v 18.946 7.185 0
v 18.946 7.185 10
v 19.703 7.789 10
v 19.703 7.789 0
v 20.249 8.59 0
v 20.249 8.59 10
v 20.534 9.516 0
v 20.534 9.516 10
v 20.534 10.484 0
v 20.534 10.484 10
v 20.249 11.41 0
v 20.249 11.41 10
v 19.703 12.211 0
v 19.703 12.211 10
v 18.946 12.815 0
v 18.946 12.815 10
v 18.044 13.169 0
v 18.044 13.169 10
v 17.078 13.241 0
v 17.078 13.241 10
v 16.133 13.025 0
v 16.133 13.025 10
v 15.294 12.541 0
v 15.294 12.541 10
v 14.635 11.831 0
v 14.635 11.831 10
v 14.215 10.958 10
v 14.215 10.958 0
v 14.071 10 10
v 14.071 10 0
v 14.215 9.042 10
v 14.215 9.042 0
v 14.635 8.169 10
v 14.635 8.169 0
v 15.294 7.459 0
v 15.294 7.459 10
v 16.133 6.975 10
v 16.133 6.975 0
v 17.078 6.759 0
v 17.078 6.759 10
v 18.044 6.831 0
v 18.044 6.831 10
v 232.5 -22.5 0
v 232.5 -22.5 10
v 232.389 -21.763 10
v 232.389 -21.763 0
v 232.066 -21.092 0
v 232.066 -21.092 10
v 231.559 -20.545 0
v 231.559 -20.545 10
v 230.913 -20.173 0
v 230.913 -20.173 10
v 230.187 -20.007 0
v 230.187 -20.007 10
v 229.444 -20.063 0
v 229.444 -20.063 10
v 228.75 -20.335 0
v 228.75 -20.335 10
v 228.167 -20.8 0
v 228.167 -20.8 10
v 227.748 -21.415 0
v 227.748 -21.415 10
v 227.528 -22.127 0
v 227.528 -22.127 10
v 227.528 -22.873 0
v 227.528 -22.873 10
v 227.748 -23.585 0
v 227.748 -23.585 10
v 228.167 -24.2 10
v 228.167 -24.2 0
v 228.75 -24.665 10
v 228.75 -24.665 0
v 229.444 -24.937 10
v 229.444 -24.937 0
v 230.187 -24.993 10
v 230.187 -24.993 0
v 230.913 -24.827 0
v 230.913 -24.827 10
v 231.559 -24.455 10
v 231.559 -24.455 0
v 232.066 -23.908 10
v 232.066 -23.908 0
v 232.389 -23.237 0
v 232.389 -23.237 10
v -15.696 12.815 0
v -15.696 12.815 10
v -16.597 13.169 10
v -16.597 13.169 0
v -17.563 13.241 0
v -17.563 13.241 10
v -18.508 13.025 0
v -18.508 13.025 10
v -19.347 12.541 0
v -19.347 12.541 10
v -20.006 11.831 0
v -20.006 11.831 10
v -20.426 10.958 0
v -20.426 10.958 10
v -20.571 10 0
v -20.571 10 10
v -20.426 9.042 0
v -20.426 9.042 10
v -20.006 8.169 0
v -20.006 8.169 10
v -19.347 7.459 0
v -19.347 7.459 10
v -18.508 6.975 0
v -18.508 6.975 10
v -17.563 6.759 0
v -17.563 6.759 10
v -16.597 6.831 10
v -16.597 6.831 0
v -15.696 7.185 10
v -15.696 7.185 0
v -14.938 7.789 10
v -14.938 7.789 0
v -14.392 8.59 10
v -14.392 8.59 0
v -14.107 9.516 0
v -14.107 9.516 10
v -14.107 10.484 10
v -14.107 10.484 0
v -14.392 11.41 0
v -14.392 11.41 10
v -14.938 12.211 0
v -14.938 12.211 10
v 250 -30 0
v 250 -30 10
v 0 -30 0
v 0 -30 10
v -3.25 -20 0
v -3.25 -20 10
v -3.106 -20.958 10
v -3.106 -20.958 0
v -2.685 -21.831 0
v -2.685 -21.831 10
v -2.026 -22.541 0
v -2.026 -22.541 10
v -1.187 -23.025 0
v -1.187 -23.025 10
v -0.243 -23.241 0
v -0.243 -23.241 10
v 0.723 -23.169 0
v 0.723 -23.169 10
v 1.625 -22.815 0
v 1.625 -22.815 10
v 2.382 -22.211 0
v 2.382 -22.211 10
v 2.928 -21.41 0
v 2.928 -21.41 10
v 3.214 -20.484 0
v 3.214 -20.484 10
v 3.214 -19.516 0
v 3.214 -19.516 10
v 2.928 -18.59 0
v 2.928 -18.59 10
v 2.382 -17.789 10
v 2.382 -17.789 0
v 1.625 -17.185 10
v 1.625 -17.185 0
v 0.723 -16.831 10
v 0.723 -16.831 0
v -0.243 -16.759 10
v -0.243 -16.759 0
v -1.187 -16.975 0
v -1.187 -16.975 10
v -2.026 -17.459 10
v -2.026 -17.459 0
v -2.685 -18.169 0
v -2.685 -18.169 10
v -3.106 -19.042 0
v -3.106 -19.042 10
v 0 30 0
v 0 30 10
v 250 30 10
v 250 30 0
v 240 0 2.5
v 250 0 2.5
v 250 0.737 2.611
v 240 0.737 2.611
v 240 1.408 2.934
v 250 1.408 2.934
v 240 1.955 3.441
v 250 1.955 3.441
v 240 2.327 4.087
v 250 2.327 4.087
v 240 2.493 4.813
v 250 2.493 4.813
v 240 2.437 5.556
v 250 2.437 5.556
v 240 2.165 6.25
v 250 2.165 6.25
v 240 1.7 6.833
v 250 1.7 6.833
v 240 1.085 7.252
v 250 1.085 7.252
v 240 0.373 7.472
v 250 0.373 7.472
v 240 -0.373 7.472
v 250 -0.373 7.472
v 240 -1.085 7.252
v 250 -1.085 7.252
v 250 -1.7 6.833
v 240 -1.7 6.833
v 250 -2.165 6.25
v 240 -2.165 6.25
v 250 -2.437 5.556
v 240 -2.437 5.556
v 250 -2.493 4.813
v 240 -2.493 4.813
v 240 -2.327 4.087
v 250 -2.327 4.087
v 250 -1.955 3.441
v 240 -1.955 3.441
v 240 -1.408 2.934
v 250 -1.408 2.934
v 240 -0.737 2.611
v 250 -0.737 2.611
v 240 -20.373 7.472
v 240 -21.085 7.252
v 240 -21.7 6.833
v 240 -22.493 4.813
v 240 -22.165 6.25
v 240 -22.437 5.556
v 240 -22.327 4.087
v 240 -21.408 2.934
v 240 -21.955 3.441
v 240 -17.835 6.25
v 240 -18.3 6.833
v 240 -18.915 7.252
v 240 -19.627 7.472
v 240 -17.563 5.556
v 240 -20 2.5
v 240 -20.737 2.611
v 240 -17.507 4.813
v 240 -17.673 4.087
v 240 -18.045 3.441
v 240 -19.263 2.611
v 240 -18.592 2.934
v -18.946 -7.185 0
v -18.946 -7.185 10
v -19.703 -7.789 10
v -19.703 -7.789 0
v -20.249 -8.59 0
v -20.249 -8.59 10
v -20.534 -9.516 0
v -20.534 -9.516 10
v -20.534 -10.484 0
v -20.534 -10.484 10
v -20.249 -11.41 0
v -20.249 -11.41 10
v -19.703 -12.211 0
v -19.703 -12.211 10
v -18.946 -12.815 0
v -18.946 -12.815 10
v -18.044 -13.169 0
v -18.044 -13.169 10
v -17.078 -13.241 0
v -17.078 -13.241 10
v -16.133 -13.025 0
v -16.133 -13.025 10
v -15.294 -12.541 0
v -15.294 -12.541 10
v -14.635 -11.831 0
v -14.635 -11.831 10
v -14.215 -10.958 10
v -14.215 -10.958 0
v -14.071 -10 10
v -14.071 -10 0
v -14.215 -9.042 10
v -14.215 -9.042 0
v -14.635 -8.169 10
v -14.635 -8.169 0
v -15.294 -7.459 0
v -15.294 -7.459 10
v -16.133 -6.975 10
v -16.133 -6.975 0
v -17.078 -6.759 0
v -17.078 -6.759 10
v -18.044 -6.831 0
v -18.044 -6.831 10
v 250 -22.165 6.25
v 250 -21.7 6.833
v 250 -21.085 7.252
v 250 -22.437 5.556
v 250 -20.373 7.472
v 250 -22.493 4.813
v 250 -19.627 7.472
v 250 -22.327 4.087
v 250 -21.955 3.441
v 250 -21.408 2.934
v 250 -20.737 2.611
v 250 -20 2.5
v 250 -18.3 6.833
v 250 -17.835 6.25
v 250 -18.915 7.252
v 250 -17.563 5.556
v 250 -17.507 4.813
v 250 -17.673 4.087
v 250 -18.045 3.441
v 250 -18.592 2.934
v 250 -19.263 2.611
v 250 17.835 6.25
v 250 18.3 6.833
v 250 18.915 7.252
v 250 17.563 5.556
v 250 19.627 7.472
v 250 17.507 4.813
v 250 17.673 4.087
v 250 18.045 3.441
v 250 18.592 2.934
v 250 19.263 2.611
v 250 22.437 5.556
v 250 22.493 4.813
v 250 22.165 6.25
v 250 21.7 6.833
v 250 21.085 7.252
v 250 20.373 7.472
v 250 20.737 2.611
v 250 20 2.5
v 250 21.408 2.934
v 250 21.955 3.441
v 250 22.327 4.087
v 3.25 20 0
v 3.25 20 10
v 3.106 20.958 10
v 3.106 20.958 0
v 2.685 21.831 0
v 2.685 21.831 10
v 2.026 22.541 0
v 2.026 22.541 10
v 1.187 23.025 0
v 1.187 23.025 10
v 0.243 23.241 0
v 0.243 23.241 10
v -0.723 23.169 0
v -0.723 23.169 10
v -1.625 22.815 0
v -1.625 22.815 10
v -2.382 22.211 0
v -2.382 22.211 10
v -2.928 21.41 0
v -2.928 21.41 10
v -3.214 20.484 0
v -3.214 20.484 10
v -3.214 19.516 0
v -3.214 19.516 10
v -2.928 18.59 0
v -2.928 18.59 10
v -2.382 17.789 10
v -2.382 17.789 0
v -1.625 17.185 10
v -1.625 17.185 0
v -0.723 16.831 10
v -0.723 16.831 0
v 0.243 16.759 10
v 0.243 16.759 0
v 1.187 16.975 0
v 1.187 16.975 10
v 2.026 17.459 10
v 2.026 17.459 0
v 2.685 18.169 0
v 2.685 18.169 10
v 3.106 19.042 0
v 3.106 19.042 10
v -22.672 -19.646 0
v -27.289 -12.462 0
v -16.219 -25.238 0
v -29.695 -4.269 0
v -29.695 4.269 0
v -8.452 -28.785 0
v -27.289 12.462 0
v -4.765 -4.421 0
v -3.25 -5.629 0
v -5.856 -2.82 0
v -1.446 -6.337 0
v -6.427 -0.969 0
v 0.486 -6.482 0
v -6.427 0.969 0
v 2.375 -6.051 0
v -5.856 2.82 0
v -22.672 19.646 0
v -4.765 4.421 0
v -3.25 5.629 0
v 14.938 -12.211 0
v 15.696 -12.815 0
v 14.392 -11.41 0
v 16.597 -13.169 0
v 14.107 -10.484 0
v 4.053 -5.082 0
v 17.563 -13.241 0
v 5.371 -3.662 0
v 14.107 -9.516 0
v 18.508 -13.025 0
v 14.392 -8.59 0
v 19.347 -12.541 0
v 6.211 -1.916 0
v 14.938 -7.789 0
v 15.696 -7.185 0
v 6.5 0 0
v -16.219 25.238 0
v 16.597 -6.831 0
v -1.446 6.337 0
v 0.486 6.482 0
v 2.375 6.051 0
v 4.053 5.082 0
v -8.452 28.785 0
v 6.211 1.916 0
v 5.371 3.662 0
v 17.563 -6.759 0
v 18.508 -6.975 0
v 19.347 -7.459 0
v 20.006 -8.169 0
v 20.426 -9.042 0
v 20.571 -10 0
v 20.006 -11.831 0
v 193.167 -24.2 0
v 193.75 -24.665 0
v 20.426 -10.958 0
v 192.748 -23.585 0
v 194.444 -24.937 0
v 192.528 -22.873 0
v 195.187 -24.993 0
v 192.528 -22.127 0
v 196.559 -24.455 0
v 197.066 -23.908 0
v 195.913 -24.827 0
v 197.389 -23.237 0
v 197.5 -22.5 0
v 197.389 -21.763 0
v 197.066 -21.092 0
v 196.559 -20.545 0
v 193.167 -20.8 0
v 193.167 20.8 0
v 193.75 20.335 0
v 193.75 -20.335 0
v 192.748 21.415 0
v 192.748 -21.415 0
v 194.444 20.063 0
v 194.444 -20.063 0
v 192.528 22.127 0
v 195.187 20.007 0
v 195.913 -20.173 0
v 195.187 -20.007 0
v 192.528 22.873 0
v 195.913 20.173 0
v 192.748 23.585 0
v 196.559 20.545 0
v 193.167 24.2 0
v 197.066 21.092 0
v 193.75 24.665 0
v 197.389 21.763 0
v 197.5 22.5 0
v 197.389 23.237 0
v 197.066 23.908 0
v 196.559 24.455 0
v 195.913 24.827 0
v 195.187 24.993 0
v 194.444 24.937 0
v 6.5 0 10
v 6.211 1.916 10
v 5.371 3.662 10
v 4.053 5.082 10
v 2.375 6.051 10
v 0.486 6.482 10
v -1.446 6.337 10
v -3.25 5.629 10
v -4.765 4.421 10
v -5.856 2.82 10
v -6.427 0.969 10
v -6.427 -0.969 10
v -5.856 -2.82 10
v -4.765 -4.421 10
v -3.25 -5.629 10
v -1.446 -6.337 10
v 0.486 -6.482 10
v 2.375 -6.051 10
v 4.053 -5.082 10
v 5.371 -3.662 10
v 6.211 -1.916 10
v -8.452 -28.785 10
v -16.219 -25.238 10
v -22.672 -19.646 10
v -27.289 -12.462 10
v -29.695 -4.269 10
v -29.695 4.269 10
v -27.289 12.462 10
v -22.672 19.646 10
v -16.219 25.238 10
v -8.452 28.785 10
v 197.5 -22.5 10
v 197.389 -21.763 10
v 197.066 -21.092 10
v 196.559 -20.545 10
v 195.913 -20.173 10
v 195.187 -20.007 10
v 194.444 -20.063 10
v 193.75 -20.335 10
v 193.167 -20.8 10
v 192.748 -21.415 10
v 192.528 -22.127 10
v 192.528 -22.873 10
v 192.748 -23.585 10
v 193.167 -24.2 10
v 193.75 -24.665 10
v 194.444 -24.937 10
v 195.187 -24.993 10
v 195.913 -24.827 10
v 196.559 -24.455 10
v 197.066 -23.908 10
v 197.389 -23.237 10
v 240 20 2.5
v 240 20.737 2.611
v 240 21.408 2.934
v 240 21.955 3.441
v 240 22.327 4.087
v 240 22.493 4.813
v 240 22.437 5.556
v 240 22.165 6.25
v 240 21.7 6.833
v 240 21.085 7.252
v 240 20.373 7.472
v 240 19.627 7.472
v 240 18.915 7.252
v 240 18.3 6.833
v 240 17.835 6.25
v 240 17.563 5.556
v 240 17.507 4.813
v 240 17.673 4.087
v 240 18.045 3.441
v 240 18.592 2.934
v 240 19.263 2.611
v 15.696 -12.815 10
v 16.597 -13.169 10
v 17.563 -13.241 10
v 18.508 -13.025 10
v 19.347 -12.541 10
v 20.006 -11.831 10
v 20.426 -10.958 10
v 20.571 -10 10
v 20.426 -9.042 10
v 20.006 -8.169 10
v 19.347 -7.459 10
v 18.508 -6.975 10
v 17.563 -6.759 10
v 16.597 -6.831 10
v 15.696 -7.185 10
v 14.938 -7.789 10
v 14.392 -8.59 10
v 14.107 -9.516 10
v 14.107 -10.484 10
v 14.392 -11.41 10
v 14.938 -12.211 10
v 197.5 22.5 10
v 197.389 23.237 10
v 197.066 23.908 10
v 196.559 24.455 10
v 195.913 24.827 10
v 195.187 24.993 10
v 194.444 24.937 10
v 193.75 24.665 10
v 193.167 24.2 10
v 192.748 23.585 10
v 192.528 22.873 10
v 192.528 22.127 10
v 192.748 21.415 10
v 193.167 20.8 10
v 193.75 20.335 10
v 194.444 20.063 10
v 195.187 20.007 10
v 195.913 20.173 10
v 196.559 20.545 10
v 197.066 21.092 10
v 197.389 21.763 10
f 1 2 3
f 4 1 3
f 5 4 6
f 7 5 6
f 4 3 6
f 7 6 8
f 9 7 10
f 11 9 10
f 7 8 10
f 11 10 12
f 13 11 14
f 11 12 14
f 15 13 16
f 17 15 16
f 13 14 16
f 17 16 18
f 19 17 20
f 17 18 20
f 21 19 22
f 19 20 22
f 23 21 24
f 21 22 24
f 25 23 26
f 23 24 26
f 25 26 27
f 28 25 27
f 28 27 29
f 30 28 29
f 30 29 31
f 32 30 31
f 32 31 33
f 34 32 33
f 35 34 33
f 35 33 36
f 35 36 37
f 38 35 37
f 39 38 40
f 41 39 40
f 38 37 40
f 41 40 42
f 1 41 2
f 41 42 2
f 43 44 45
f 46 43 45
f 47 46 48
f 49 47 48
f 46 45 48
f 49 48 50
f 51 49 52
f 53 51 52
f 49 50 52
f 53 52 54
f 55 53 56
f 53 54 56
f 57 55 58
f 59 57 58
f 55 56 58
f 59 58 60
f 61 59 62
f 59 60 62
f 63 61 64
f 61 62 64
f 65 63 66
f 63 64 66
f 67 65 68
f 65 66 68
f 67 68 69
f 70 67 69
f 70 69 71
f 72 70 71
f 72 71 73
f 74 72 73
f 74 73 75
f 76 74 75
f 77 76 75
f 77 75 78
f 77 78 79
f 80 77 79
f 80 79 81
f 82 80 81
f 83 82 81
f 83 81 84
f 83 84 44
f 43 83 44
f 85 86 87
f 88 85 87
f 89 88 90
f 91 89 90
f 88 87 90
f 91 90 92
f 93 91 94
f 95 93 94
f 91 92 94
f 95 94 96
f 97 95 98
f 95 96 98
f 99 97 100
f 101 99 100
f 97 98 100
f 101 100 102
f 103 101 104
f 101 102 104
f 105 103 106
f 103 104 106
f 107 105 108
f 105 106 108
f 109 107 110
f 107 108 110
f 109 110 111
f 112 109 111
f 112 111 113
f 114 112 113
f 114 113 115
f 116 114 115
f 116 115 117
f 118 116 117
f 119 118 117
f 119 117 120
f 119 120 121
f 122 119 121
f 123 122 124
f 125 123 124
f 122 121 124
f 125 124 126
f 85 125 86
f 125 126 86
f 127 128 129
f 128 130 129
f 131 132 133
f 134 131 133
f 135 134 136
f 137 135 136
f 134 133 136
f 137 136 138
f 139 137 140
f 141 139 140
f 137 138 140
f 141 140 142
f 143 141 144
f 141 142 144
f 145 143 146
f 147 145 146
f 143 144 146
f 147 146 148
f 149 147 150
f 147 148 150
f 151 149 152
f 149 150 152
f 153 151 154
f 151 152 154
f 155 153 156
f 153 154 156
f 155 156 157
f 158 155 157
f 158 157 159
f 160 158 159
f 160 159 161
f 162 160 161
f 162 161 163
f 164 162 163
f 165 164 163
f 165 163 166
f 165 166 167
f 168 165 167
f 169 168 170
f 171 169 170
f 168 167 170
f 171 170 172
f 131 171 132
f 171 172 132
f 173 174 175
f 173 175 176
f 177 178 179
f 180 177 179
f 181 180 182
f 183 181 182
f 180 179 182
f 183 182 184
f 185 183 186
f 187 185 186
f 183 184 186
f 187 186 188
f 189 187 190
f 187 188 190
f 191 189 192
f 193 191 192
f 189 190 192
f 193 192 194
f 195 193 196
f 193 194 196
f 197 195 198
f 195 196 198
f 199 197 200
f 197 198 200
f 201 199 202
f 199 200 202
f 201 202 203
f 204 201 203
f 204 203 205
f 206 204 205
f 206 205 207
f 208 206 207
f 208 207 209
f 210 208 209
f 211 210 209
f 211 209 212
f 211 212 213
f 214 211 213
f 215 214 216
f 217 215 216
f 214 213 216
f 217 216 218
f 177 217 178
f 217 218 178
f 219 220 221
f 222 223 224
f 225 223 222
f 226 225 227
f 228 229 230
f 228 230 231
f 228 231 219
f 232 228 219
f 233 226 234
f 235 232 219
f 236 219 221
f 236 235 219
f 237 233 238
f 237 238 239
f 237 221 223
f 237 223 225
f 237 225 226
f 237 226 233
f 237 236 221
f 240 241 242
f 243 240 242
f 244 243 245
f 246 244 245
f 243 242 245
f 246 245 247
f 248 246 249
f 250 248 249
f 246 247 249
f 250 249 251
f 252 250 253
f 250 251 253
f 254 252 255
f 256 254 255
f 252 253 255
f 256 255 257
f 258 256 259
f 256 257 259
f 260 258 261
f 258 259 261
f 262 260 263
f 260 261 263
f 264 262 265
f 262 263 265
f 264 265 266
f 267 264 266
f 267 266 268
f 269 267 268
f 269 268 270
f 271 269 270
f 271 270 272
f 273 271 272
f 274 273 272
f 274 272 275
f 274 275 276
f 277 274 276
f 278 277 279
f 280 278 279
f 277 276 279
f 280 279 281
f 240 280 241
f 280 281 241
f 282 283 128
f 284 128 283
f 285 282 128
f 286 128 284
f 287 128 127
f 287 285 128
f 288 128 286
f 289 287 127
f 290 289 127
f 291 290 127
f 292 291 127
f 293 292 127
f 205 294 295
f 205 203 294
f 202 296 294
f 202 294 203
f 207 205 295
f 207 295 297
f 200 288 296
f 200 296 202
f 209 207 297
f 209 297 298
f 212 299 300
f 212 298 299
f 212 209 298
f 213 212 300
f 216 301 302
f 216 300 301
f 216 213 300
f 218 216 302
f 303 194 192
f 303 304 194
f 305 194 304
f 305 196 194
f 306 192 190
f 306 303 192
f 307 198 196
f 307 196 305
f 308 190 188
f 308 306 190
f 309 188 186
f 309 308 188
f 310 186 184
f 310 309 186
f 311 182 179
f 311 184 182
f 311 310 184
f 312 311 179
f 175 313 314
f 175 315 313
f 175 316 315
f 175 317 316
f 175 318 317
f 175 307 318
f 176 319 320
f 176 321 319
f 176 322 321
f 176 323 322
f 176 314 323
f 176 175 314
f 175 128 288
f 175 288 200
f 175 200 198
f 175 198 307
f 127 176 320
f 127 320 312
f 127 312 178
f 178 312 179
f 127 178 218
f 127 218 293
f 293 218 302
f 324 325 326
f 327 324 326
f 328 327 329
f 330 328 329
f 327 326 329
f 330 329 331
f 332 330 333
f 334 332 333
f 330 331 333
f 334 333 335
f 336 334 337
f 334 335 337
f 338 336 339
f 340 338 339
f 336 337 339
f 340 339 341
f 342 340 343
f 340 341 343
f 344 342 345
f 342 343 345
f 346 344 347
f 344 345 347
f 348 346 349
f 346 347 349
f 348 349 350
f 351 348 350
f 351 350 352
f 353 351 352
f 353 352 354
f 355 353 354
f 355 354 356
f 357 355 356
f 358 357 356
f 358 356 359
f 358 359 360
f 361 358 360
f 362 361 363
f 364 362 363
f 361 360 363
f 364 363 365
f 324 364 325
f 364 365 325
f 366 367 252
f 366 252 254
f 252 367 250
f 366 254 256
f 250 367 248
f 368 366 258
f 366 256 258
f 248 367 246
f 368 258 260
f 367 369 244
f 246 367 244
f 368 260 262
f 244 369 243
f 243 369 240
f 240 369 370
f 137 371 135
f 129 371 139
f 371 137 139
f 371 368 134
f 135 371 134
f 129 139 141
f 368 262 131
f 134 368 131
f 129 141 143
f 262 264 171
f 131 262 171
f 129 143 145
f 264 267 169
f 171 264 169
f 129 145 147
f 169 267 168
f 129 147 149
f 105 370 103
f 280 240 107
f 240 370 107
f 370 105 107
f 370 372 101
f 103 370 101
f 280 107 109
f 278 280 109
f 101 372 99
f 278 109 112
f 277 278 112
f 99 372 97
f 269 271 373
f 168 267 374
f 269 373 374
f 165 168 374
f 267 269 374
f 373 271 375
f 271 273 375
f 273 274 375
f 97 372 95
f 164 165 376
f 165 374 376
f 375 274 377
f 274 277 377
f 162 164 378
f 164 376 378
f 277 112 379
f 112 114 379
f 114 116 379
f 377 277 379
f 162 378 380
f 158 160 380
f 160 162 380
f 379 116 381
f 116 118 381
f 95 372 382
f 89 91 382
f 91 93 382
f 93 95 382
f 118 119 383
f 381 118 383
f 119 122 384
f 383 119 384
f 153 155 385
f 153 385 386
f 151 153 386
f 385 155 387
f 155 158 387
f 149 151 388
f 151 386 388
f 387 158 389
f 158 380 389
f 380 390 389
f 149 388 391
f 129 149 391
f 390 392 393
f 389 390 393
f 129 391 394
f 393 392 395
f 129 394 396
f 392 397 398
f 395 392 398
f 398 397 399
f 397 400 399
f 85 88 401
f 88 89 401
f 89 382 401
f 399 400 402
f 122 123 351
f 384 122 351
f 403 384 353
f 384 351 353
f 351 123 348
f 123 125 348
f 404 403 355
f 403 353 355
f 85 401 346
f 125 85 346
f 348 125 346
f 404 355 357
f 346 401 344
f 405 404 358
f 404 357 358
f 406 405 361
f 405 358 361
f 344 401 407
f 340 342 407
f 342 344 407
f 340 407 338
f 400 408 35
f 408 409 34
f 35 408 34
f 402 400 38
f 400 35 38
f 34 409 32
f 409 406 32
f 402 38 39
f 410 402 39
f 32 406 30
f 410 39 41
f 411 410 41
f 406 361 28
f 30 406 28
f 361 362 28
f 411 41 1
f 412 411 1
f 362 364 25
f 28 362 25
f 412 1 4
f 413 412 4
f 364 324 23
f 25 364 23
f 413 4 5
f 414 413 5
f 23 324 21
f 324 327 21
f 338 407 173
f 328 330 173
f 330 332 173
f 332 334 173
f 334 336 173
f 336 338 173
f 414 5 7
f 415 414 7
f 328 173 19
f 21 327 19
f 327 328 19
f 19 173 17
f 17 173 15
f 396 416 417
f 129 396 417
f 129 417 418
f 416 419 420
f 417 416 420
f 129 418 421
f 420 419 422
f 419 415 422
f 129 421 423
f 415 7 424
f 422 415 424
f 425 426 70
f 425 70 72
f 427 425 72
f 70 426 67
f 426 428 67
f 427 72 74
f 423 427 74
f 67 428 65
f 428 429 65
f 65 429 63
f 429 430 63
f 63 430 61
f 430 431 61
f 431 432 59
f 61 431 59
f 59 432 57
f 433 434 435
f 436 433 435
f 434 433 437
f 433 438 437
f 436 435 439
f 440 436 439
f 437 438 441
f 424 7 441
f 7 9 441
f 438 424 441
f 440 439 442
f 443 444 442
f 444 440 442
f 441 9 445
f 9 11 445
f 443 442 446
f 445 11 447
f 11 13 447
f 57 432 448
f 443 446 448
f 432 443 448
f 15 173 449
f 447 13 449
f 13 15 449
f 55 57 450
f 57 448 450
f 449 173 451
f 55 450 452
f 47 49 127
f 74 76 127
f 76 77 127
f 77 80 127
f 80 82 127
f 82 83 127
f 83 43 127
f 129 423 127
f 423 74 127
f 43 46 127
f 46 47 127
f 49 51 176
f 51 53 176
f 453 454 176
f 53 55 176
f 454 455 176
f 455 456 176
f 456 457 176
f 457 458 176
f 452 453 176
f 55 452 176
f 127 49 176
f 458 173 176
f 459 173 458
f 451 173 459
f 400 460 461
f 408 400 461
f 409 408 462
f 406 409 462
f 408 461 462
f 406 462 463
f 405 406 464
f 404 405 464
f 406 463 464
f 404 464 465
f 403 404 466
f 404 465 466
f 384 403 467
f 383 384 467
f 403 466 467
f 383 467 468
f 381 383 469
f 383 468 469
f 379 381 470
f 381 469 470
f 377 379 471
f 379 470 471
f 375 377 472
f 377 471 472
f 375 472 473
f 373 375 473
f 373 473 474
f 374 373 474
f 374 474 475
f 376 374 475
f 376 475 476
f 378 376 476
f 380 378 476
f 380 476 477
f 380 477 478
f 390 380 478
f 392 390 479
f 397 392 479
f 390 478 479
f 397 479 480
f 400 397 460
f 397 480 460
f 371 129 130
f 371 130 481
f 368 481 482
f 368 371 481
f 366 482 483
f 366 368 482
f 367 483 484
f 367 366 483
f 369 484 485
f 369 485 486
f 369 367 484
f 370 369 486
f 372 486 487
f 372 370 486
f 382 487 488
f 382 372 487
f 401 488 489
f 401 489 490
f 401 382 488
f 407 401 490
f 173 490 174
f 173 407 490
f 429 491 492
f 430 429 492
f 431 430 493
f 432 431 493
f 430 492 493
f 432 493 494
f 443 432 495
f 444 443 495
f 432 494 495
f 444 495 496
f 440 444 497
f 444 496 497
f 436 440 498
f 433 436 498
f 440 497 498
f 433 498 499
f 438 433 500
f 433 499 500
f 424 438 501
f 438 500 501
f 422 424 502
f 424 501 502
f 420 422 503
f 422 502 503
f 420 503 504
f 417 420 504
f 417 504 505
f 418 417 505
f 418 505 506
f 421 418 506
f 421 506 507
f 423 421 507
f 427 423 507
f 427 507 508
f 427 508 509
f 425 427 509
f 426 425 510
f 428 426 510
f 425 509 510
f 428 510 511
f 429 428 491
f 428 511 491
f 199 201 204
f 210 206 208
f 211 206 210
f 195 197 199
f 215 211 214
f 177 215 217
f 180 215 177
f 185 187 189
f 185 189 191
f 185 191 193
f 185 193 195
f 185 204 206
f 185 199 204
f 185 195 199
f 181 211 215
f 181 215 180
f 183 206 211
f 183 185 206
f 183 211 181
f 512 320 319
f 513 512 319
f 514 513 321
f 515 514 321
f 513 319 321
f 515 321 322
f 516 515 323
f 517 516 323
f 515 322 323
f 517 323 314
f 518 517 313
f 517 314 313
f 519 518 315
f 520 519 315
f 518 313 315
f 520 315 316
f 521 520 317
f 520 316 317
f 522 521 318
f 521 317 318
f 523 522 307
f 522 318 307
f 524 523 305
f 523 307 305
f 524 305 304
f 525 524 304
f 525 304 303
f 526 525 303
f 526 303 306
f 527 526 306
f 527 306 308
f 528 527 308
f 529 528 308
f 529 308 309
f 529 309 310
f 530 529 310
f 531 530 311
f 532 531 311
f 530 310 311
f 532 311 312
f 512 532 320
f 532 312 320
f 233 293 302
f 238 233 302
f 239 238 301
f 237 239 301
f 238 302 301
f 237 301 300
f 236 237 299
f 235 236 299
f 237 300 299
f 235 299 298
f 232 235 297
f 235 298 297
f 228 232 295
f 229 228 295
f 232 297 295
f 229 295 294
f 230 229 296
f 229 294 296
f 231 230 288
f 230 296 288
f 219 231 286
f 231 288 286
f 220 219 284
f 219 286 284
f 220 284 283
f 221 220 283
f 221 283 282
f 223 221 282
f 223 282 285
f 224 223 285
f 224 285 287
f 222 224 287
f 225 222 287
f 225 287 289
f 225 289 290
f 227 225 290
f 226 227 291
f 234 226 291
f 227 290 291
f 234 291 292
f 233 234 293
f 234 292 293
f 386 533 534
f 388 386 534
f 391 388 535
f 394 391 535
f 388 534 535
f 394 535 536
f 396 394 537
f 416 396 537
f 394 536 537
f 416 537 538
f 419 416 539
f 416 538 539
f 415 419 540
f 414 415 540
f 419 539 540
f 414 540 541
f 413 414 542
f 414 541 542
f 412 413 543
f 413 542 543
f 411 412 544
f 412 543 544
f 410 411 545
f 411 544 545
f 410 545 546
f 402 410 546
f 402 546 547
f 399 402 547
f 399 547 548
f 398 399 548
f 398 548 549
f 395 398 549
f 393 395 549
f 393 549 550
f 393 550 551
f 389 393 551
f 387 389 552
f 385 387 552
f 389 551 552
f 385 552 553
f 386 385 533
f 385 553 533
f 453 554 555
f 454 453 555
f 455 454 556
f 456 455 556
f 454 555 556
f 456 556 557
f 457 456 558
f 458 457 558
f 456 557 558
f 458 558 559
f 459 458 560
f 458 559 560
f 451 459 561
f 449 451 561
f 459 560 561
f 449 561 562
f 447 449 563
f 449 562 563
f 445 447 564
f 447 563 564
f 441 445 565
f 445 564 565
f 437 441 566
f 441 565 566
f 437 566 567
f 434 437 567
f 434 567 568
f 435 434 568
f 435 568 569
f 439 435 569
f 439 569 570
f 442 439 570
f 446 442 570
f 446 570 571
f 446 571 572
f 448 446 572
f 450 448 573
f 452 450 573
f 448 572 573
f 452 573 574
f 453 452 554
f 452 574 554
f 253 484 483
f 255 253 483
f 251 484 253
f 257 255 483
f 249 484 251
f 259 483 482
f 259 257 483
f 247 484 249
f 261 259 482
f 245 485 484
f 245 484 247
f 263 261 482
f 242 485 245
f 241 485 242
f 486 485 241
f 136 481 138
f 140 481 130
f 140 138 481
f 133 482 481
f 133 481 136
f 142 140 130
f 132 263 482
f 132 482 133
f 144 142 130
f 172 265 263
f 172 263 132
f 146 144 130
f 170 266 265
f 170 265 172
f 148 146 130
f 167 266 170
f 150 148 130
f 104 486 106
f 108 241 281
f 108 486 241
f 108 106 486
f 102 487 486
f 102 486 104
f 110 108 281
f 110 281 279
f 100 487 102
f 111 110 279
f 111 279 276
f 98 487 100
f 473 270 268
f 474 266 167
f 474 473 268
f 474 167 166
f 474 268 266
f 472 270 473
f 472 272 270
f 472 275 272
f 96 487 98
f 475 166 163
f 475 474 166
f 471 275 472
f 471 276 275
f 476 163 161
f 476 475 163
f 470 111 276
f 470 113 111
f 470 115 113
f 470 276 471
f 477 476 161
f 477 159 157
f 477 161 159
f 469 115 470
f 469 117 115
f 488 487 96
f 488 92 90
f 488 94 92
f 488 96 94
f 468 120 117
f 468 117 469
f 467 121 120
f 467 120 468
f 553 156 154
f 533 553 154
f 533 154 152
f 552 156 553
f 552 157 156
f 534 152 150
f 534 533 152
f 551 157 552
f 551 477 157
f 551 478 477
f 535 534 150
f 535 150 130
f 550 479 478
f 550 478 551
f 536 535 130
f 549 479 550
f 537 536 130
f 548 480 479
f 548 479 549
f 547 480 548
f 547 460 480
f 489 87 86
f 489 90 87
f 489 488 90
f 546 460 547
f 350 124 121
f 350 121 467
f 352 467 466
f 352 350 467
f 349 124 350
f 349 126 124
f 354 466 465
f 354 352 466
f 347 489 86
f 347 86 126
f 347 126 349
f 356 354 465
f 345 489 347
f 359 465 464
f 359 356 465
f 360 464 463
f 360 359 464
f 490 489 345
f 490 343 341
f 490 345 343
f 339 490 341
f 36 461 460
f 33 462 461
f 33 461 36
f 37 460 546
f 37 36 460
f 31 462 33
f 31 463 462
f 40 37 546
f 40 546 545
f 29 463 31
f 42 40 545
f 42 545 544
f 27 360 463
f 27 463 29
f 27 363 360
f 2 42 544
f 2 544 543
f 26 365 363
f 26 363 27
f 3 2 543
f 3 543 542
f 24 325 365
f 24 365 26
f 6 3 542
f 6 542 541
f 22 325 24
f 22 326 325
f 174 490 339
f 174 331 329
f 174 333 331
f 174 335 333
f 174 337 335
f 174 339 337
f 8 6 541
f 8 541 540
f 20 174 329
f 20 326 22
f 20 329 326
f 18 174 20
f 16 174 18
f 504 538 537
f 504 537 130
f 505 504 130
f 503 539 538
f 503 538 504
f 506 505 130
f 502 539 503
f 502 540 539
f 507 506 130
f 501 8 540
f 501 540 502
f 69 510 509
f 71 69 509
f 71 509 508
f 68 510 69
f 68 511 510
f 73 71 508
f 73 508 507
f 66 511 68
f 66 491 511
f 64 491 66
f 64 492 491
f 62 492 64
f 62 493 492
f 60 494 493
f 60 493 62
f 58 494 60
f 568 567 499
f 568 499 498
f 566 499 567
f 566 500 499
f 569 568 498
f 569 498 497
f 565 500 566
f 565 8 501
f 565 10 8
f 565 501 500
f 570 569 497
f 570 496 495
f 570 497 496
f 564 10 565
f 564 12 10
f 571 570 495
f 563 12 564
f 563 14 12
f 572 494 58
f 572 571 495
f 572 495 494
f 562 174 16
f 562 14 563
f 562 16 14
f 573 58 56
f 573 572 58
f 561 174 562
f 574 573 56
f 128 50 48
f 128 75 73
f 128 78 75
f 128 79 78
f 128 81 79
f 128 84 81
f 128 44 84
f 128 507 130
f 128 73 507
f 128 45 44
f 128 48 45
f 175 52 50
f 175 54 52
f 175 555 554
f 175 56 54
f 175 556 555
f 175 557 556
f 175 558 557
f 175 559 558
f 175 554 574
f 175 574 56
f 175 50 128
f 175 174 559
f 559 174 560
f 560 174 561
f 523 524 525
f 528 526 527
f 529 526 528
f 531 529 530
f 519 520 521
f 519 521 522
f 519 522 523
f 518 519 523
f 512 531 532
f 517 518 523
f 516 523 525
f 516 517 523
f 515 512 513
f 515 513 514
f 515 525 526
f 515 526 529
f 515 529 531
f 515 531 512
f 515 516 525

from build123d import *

# Parameters (mm, degrees)
SALIENTE_EXTRUIR1_DEPTH = 10
CROQUIS6_R              = 17.5
CORTAR_EXTRUIR5_DEPTH   = 203.484567313
CROQUIS7_R              = 2.5
CORTAR_EXTRUIR6_DEPTH   = 10
SKETCH1_W               = 10
SKETCH1_H               = 60
BOSS_EXTRUDE1_DEPTH     = 50
SKETCH2_R               = 2.5
CUT_EXTRUDE1_DEPTH      = 10
SKETCH5_R               = 2.5
CUT_EXTRUDE2_DEPTH      = 252.992063367
SKETCH6_R               = 17.5
SKETCH6_R_2             = 6.5
BOSS_EXTRUDE2_DEPTH     = 10
SKETCH7_R               = 3.25
CUT_EXTRUDE3_DEPTH      = 10
CIRPATTERN1_COUNT       = 6


with BuildPart() as part:
    # Croquis1 → Saliente-Extruir1 (new body)
    with BuildSketch(Plane.XY):
        with BuildLine():
            Line((200, 30), (200, -30))
            Line((200, -30), (0, -30))
            ThreePointArc((0, -30), (-30, 0), (0, 30))
            Line((0, 30), (200, 30))
        make_face()
    extrude(amount=SALIENTE_EXTRUIR1_DEPTH)

    # Croquis6 → Cortar-Extruir5 (cut, through all)
    with BuildSketch(Plane.XY.offset(10)):
        Circle(CROQUIS6_R)
    extrude(amount=-CORTAR_EXTRUIR5_DEPTH, mode=Mode.SUBTRACT)

    # Croquis7 → Cortar-Extruir6 (cut)
    with BuildSketch(Plane.XY.offset(10)):
        with Locations((195, 22.5)):
            Circle(CROQUIS7_R)
        with Locations((195, -22.5)):
            Circle(CROQUIS7_R)
    extrude(amount=-CORTAR_EXTRUIR6_DEPTH, mode=Mode.SUBTRACT)

    # Sketch1 → Boss-Extrude1 (add)
    with BuildSketch(Plane(origin=(200, 0, 0), x_dir=(0, 0, -1), z_dir=(1, 0, 0))):
        with Locations((-5, 0)):
            Rectangle(SKETCH1_W, SKETCH1_H)
    extrude(amount=BOSS_EXTRUDE1_DEPTH)

    # Sketch2 → Cut-Extrude1 (cut)
    with BuildSketch(Plane(origin=(250, 0, 0), x_dir=(0, 0, -1), z_dir=(1, 0, 0))):
        with Locations((-5, 0)):
            Circle(SKETCH2_R)
        with Locations((-5, 20)):
            Circle(SKETCH2_R)
        with Locations((-5, -20)):
            Circle(SKETCH2_R)
    extrude(amount=-CUT_EXTRUDE1_DEPTH, mode=Mode.SUBTRACT)

    # Sketch5 → Cut-Extrude2 (cut, through all)
    with BuildSketch(Plane.XY.offset(10)):
        with Locations((230, -22.5)):
            Circle(SKETCH5_R)
    extrude(amount=-CUT_EXTRUDE2_DEPTH, mode=Mode.SUBTRACT)

    # Sketch6 → Boss-Extrude2 (add)
    with BuildSketch(Plane.XY.offset(10)):
        Circle(SKETCH6_R)
        Circle(SKETCH6_R_2, mode=Mode.SUBTRACT)
    extrude(amount=-BOSS_EXTRUDE2_DEPTH)

    # Sketch7 → Cut-Extrude3 (cut)
    with BuildSketch(Plane.XY.offset(10)):
        with Locations((0, 20)):
            Circle(SKETCH7_R)
    cut_extrude3 = extrude(amount=-CUT_EXTRUDE3_DEPTH, mode=Mode.SUBTRACT)

    # CirPattern1: Cut-Extrude3 ×6 about axis
    cirpattern1_axis = Axis((0, 0, 0), (0, 0, 1))
    for i in range(1, CIRPATTERN1_COUNT):
        add(cut_extrude3.rotate(cirpattern1_axis, i * 360 / CIRPATTERN1_COUNT), mode=Mode.SUBTRACT)


solid = part.part
